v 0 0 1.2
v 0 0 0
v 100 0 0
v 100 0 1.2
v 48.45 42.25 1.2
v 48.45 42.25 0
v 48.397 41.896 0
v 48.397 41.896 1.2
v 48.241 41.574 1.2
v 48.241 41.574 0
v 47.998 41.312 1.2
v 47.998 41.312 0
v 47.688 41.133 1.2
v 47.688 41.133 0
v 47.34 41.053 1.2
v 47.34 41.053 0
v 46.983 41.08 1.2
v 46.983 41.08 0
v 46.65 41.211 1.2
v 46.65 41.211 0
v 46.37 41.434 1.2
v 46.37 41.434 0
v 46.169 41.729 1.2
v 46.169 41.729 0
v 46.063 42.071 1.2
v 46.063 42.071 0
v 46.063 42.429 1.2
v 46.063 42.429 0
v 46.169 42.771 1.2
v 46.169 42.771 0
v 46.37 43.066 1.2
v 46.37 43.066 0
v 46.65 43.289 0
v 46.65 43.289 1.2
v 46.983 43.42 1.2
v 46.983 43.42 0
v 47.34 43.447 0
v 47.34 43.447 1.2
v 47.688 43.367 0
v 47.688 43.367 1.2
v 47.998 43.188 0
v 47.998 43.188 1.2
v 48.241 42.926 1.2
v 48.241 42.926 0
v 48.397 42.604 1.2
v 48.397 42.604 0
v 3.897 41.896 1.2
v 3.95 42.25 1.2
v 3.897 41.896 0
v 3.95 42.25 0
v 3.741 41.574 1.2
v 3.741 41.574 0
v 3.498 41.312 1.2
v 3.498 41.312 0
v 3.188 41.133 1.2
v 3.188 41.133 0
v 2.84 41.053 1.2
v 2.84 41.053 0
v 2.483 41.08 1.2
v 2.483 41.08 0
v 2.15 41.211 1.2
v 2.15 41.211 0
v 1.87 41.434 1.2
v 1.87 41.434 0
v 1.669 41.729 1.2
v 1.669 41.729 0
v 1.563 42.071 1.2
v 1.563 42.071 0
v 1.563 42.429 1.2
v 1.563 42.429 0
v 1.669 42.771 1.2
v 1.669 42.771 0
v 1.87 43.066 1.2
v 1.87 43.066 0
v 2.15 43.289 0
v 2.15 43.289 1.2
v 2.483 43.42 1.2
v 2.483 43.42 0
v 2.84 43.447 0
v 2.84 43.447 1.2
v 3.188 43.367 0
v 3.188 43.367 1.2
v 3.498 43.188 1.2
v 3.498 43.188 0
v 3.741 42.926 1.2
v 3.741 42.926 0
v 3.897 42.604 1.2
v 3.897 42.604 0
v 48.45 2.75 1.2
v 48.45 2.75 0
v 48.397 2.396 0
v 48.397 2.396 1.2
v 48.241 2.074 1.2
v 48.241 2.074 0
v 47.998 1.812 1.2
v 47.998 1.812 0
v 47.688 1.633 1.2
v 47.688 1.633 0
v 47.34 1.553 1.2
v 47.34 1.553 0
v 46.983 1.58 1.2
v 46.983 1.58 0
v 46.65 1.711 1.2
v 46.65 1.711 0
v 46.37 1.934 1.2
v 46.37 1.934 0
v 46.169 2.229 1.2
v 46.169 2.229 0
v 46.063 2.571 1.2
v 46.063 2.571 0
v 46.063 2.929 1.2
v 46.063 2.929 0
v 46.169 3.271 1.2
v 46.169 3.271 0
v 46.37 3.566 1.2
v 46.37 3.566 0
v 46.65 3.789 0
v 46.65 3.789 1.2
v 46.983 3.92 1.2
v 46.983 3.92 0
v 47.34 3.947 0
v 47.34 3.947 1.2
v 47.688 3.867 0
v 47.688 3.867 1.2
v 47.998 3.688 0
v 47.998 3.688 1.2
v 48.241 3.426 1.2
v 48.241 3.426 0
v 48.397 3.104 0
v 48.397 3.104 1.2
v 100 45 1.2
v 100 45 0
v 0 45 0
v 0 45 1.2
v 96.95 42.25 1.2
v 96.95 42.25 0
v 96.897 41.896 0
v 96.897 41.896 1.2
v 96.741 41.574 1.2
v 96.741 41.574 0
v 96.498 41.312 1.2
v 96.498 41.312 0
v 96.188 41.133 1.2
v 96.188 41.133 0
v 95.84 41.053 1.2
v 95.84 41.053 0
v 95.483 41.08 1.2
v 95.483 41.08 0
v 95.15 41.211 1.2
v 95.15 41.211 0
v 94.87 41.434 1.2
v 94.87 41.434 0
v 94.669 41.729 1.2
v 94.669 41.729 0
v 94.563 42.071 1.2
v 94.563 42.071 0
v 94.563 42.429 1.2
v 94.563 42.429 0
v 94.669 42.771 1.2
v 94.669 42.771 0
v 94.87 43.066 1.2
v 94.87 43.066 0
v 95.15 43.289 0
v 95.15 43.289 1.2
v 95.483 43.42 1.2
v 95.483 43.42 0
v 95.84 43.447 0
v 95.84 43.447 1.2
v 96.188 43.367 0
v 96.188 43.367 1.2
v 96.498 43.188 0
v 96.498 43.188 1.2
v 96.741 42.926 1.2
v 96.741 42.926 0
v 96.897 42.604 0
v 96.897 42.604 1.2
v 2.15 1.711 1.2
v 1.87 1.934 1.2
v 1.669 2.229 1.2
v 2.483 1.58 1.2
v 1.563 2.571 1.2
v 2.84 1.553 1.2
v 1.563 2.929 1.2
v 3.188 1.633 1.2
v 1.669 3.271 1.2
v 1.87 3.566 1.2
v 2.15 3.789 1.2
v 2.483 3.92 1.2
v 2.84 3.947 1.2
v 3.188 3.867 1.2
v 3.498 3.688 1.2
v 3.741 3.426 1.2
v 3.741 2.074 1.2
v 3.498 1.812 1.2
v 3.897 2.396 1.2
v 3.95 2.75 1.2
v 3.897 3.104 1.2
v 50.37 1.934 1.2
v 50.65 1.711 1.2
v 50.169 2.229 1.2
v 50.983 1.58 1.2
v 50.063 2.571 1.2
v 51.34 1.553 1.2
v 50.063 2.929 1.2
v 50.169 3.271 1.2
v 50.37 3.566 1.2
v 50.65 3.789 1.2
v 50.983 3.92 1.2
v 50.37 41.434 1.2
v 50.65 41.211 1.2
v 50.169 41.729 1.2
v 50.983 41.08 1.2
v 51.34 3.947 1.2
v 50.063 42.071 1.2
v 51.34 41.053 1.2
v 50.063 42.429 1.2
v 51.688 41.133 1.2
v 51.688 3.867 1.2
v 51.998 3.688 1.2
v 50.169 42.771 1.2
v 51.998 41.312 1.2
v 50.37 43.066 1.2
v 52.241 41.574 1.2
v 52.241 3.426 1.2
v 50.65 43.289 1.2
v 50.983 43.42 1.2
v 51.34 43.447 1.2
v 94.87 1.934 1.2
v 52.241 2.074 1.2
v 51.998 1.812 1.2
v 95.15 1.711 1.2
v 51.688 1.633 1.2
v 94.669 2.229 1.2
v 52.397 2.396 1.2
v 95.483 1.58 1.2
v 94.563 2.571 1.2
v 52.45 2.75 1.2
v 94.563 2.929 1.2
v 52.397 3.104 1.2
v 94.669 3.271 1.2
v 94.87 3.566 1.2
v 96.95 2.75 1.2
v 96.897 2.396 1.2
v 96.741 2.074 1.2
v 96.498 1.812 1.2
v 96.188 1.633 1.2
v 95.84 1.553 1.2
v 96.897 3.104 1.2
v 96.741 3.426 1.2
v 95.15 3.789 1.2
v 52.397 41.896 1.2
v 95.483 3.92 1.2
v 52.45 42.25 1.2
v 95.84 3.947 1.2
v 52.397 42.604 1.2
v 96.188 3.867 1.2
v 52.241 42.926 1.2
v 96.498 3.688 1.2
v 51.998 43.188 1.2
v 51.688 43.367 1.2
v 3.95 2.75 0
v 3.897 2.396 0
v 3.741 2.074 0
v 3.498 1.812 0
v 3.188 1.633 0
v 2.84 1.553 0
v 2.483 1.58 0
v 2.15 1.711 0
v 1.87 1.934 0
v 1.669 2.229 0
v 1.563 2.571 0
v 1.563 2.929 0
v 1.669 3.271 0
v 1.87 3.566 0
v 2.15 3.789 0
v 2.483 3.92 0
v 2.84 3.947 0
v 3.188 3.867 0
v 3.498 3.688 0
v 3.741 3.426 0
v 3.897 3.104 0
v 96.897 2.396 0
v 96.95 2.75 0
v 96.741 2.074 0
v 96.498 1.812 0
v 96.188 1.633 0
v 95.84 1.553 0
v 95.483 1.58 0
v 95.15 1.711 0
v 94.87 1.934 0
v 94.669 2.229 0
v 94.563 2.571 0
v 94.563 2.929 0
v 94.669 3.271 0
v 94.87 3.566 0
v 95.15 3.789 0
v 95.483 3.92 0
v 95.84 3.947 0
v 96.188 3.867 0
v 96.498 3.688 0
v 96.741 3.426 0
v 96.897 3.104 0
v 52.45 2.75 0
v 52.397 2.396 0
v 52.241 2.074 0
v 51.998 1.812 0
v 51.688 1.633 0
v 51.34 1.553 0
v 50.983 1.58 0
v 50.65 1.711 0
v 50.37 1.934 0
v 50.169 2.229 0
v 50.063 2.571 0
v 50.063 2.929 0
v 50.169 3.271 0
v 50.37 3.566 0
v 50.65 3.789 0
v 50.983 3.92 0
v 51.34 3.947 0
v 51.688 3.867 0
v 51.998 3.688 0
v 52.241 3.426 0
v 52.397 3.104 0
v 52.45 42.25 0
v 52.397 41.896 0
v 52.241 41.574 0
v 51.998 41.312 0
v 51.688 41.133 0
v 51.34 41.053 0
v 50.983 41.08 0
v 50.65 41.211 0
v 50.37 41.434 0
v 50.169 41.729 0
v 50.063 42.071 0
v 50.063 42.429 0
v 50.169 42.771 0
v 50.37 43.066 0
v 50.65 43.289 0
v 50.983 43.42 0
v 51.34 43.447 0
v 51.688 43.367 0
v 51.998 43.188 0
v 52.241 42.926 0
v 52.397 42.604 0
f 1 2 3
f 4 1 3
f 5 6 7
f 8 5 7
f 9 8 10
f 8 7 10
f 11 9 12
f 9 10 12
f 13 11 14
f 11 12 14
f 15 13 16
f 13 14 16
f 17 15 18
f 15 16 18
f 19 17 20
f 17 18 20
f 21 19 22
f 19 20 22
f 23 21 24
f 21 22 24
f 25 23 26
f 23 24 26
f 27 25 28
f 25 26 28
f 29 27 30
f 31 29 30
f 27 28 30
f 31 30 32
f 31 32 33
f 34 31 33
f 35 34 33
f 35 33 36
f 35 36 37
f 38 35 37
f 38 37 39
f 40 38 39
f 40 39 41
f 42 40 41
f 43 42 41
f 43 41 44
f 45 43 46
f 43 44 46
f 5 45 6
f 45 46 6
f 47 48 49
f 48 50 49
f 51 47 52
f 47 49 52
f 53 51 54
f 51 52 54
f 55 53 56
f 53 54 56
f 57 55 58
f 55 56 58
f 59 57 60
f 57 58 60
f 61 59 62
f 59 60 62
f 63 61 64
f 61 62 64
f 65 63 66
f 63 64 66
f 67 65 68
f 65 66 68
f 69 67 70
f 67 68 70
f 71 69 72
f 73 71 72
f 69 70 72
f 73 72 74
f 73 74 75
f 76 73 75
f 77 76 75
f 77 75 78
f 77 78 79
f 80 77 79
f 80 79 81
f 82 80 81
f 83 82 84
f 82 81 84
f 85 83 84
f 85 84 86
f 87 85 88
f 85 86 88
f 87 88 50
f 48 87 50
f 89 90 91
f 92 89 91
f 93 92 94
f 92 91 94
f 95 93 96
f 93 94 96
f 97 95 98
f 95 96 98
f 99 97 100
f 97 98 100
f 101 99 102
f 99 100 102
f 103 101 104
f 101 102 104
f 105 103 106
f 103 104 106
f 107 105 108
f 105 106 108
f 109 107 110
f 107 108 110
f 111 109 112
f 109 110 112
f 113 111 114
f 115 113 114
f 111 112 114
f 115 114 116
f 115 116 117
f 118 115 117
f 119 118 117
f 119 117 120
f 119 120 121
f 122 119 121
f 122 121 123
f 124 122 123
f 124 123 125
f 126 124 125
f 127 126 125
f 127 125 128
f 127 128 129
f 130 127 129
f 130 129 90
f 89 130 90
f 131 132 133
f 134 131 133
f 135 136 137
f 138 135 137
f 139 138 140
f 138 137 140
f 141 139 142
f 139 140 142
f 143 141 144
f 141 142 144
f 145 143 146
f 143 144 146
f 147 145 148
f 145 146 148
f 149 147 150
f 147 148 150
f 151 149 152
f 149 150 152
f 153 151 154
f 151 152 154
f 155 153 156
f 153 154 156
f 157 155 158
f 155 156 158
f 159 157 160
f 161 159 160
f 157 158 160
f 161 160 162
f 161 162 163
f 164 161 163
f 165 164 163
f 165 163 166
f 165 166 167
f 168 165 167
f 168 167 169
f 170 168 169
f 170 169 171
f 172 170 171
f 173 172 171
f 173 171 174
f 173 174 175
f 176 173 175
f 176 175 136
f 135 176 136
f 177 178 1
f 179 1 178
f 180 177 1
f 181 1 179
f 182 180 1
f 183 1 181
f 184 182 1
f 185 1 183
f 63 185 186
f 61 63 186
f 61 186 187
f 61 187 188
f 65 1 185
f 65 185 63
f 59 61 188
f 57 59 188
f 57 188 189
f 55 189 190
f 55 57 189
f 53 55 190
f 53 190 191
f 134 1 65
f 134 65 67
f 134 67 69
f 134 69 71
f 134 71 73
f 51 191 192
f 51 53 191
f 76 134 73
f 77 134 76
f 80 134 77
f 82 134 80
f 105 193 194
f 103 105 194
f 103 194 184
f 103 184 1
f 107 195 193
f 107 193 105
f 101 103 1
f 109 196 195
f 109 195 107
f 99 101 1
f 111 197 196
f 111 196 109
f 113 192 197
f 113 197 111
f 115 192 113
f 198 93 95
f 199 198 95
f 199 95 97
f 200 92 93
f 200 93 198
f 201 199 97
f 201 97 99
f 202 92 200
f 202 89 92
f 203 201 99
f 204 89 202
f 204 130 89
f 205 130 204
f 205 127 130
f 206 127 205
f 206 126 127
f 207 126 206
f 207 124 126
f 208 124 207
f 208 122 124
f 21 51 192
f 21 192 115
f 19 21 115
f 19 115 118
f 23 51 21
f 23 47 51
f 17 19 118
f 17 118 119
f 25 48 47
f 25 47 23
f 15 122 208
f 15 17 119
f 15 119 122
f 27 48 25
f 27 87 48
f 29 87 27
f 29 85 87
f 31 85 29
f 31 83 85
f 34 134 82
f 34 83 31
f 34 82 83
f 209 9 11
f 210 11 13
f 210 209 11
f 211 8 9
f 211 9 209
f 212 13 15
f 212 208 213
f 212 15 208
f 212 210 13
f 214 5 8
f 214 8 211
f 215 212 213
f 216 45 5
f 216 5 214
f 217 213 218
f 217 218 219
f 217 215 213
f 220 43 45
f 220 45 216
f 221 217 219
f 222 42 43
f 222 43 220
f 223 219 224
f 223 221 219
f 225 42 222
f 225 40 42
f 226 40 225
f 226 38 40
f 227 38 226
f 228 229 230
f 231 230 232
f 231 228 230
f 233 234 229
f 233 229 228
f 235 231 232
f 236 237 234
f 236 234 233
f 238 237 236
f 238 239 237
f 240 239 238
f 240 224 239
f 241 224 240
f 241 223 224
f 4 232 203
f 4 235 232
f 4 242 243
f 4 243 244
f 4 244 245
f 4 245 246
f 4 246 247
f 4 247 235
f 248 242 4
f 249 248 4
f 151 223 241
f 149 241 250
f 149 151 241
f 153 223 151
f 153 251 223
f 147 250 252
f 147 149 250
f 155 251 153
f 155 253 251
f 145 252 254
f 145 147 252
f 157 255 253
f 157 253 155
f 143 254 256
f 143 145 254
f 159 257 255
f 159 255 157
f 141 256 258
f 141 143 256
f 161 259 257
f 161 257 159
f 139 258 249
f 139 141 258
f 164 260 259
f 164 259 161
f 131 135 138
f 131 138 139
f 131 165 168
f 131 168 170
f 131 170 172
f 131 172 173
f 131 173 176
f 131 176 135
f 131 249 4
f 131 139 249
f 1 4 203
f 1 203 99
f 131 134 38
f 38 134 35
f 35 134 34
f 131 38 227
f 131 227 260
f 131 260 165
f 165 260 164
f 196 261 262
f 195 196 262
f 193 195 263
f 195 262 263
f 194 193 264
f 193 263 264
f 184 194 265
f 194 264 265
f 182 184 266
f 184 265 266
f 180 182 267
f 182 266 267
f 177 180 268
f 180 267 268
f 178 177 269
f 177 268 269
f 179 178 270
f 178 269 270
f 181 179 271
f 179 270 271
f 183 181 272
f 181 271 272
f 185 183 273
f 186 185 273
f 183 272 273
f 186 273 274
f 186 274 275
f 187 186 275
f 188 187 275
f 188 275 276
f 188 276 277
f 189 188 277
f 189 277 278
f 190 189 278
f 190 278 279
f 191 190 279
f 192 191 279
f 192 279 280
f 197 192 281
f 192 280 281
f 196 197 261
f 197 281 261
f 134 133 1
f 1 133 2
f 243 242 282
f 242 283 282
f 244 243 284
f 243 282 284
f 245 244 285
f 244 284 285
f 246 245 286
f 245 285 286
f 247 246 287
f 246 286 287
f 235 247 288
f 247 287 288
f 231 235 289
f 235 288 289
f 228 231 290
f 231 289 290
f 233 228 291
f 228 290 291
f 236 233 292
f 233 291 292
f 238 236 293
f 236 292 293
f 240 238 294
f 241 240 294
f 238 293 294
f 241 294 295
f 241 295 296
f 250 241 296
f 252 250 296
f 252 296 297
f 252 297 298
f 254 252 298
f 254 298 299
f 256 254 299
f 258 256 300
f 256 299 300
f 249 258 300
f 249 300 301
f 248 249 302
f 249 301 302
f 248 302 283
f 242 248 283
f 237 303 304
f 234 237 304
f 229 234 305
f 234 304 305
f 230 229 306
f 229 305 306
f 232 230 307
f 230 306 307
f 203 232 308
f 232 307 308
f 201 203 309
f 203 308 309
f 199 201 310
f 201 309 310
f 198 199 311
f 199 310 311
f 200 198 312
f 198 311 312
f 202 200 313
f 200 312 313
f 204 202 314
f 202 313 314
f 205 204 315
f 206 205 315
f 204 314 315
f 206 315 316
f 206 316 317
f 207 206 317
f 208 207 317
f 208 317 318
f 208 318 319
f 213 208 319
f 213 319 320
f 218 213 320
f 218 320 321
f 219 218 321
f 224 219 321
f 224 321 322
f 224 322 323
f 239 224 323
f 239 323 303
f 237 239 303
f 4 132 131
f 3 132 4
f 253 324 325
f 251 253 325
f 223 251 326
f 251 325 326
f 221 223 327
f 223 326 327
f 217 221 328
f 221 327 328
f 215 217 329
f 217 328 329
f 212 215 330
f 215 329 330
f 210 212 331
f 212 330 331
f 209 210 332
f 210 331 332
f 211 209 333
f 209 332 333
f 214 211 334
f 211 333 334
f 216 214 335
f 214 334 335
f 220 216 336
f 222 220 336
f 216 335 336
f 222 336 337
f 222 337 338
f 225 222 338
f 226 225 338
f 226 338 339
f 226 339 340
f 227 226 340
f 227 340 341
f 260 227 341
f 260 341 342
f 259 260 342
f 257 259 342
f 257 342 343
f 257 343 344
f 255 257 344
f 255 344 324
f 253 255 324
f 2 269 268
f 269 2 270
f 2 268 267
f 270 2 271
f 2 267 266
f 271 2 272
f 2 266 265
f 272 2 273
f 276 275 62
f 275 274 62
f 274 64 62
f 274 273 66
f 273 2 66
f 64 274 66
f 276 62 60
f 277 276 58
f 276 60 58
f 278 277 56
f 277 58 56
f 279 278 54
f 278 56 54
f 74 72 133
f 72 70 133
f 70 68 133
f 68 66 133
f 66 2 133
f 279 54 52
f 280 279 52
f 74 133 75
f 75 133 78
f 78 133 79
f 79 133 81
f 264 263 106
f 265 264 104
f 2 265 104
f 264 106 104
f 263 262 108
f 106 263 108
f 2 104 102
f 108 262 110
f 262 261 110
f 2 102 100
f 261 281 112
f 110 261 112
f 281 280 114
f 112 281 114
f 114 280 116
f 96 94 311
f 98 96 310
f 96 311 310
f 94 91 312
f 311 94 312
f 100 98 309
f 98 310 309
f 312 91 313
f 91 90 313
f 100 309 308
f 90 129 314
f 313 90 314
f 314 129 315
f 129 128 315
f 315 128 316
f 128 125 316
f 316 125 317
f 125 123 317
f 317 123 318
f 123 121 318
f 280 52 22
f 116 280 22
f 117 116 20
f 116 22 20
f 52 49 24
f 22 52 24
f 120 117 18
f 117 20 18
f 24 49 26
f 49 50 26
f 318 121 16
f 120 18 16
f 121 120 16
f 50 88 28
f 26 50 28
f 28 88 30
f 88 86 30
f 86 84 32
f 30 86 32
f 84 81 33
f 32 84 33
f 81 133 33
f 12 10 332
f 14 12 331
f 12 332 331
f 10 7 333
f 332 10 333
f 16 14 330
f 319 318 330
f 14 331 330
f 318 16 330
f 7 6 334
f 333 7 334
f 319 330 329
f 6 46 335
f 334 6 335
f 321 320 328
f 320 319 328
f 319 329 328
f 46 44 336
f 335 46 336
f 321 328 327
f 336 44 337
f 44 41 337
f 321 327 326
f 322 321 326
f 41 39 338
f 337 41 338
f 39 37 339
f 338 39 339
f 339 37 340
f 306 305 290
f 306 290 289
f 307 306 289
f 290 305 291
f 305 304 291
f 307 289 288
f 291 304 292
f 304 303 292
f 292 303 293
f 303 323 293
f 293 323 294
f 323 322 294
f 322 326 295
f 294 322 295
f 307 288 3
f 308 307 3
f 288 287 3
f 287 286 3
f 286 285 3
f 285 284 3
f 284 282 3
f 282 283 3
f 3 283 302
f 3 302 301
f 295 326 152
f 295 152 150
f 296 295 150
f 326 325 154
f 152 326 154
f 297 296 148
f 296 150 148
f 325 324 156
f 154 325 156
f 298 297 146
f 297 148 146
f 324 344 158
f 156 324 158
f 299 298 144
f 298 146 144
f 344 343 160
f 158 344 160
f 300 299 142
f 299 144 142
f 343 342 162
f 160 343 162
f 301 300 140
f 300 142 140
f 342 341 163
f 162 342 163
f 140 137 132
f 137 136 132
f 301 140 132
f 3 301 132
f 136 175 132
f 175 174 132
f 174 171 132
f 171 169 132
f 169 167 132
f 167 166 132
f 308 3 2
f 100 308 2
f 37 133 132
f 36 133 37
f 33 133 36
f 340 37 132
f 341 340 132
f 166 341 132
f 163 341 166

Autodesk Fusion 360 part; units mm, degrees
sketch "Sketch1" plane through (0, 0, 0) normal (0, 0, 1) x (1, 0, 0)
  line L0 (0, 0) -> (50, 0)
  line L1 (50, 0) -> (50, 45)
  line L2 (50, 45) -> (0, 45)
  line L3 (0, 45) -> (0, 0)
  line L4 (47.25, 42.25) -> (2.75, 42.25)
  line L5 (2.75, 42.25) -> (2.75, 2.75)
  line L6 (2.75, 2.75) -> (47.25, 2.75)
  line L7 (47.25, 2.75) -> (47.25, 42.25)
  line L8 (47.25, 42.25) -> (2.75, 2.75) construction
  line L9 (2.75, 42.25) -> (47.25, 2.75) construction
  line L10 (50, 45) -> (0, 0) construction
  circle A0 centre (2.75, 42.25) radius 1.2
  circle A1 centre (2.75, 2.75) radius 1.2
  circle A2 centre (47.25, 42.25) radius 1.2
  circle A3 centre (47.25, 2.75) radius 1.2
  line L11 (95.75, 2.75) -> (95.75, 42.25)
  line L12 (51.25, 2.75) -> (95.75, 2.75)
  line L13 (98.5, 45) -> (48.5, 0) construction
  line L14 (51.25, 42.25) -> (95.75, 2.75) construction
  line L15 (95.75, 42.25) -> (51.25, 2.75) construction
  circle A4 centre (51.25, 42.25) radius 1.2
  circle A5 centre (51.25, 2.75) radius 1.2
  line L16 (95.75, 42.25) -> (51.25, 42.25)
  circle A6 centre (95.75, 42.25) radius 1.2
  circle A7 centre (95.75, 2.75) radius 1.2
  line L17 (51.25, 42.25) -> (51.25, 2.75)
  line L18 (50, 45) -> (100, 45)
  line L19 (100, 45) -> (100, 0)
  line L20 (100, 0) -> (50, 0)
  line L21 (50, 0) -> (50, 45)
  point P0 (25, 22.5)
  point P1 (73.5, 22.5)
  dimension "d1" = 50
  dimension "d2" = 44.5
  dimension "d3" = 39.5
  dimension "d4" = 2.4
  dimension "d5" = 2.4
  dimension "d6" = 2.4
  dimension "d7" = 2.4
  dimension "d12" = 45
  dimension "d14" = 44.5
  dimension "d15" = 39.5
  dimension "d16" = 2.4
  dimension "d17" = 2.4
  dimension "d18" = 2.4
  dimension "d19" = 2.4
  dimension "d22" = 4
  dimension "d23" = 100
  dimension "d24" = 45
  dimension "d25" = 4.25
extrude "Extrude1" add sketch "Sketch1" along normal blind 1.2 contours L0 L1 L2 L3 L21 | L4 L5 L6 L7 A0 A1 A2 A3
extrude "Extrude3" add sketch "Sketch1" along normal blind 1.2 contours L1 L18 L19 L20 L21 | L11 L12 A4 A5 L16 A6 A7 L17
